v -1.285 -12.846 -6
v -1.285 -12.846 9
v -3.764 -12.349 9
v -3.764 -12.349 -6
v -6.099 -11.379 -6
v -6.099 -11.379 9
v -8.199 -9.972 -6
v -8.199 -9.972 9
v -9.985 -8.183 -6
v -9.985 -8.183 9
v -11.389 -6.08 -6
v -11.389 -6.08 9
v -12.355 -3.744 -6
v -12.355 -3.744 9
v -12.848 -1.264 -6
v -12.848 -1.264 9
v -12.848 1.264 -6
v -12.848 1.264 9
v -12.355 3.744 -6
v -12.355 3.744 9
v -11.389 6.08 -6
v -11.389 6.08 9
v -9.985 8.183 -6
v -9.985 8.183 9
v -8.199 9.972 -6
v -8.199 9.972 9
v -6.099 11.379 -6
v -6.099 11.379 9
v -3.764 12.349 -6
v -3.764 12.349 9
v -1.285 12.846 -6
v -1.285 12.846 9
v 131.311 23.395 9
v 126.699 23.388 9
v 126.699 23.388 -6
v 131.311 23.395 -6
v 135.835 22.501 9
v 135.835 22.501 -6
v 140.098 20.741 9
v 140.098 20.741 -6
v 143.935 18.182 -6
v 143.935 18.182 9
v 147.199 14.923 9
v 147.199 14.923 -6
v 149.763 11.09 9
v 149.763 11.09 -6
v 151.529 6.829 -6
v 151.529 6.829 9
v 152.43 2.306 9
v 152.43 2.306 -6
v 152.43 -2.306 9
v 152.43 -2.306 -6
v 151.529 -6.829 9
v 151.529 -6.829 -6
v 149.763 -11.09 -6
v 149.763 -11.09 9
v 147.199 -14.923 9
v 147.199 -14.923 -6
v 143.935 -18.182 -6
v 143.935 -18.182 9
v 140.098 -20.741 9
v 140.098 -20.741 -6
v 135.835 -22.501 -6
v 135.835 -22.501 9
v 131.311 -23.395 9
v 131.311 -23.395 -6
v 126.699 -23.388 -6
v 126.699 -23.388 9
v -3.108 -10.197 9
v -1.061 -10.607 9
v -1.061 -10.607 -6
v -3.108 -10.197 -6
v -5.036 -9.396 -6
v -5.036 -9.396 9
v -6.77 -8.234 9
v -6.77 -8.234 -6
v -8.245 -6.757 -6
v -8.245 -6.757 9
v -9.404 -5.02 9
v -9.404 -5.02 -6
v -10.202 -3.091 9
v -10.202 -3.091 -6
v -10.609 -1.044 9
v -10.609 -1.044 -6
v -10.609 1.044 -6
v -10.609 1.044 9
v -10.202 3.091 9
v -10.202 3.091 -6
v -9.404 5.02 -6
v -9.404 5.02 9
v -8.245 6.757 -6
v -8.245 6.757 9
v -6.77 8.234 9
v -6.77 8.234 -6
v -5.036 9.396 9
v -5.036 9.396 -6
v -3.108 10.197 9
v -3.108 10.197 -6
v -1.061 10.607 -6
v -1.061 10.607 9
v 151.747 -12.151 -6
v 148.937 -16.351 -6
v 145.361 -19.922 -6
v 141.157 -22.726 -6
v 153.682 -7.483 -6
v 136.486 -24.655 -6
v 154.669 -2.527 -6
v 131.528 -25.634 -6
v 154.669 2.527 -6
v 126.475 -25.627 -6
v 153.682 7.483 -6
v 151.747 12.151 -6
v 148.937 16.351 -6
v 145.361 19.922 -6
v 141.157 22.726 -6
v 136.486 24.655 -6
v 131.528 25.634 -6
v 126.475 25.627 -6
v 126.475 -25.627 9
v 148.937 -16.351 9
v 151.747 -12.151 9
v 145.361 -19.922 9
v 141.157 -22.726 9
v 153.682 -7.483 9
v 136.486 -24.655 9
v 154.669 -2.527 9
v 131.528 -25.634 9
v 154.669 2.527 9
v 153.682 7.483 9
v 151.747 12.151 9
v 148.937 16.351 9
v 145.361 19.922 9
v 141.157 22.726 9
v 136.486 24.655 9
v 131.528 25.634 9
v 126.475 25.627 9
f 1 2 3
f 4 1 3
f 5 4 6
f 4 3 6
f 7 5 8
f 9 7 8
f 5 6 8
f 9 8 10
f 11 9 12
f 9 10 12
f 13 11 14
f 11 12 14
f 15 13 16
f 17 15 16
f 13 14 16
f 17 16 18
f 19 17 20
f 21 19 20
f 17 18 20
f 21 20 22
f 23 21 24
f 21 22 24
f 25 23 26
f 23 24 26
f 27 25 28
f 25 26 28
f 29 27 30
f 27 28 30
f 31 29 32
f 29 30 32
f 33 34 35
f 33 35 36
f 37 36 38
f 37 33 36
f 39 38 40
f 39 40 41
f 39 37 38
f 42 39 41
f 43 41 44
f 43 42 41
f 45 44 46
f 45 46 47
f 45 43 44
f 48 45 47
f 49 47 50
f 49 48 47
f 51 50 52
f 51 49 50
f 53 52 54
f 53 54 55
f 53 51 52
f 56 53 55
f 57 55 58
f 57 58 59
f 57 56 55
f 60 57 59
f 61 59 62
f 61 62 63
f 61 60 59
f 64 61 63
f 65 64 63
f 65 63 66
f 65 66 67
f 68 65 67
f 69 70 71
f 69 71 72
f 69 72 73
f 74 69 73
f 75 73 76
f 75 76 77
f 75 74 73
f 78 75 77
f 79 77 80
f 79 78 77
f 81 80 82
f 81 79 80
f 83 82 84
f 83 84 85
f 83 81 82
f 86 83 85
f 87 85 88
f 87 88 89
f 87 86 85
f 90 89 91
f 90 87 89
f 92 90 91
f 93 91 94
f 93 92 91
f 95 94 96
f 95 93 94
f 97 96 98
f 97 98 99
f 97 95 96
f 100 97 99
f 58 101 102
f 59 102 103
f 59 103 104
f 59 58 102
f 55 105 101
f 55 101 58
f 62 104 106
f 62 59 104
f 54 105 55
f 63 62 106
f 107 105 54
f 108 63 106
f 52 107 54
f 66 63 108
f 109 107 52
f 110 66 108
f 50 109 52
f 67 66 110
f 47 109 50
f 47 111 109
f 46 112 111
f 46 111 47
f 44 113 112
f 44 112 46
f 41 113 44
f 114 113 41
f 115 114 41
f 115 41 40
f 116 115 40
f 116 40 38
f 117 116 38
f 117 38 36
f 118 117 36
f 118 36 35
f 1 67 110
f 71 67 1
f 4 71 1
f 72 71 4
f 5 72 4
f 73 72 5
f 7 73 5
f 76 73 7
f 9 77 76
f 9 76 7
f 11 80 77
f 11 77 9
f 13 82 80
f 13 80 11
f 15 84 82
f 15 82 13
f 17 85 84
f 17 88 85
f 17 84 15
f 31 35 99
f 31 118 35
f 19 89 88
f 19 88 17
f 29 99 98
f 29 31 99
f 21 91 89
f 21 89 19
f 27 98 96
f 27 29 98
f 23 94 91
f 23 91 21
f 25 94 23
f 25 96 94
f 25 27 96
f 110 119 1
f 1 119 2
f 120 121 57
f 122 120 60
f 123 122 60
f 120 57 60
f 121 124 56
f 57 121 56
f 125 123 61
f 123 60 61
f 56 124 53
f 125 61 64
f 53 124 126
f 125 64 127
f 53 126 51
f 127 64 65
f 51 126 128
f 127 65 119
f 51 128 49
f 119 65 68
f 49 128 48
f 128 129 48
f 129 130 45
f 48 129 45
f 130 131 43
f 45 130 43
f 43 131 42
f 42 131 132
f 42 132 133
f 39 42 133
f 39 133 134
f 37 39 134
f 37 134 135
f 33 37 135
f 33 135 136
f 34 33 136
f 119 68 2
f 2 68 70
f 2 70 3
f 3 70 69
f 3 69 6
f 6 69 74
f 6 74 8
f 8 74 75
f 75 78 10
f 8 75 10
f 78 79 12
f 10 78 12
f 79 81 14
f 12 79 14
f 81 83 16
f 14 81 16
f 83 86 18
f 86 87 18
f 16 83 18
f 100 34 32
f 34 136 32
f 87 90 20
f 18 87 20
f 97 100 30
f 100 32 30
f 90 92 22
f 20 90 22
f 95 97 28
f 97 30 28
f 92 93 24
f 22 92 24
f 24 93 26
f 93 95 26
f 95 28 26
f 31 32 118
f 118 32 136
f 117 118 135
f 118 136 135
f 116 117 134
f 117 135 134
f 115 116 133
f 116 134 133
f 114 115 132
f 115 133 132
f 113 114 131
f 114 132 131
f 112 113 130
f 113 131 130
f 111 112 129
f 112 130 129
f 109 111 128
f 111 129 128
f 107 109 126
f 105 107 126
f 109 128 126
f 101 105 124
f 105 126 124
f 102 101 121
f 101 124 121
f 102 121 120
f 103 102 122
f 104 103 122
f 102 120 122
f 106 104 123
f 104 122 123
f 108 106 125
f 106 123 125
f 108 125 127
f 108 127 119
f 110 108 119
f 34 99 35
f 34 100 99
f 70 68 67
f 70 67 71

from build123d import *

# Parameters (mm, degrees)
BOSS_EXTRUDE1_DEPTH      = 9
BOSS_EXTRUDE1_DEPTH_BACK = 6


with BuildPart() as part:
    # Sketch2 → Boss-Extrude1 (new, two sides)
    with BuildSketch(Plane.XY) as boss_extrude1_sk:
        with BuildLine():
            ThreePointArc((-1.285113167, -12.8458781), (-12.91, 0), (-1.285113167, 12.8458781))
            Line((-1.285113167, 12.8458781), (126.474646488, 25.627079044))
            ThreePointArc((126.474646488, 25.627079044), (154.793402461, 0), (126.474646488, -25.627079044))
            Line((126.474646488, -25.627079044), (-1.285113167, -12.8458781))
        make_face()
        with BuildLine():
            Line((-1.061139145, 10.607053489), (126.69862051, 23.388254433))
            ThreePointArc((126.69862051, 23.388254433), (152.543402461, 0), (126.69862051, -23.388254433))
            Line((126.69862051, -23.388254433), (-1.061139145, -10.607053489))
            ThreePointArc((-1.061139145, -10.607053489), (-10.66, 0), (-1.061139145, 10.607053489))
        make_face(mode=Mode.SUBTRACT)
    extrude(amount=BOSS_EXTRUDE1_DEPTH)
    extrude(boss_extrude1_sk.sketch, amount=-BOSS_EXTRUDE1_DEPTH_BACK)


solid = part.part
